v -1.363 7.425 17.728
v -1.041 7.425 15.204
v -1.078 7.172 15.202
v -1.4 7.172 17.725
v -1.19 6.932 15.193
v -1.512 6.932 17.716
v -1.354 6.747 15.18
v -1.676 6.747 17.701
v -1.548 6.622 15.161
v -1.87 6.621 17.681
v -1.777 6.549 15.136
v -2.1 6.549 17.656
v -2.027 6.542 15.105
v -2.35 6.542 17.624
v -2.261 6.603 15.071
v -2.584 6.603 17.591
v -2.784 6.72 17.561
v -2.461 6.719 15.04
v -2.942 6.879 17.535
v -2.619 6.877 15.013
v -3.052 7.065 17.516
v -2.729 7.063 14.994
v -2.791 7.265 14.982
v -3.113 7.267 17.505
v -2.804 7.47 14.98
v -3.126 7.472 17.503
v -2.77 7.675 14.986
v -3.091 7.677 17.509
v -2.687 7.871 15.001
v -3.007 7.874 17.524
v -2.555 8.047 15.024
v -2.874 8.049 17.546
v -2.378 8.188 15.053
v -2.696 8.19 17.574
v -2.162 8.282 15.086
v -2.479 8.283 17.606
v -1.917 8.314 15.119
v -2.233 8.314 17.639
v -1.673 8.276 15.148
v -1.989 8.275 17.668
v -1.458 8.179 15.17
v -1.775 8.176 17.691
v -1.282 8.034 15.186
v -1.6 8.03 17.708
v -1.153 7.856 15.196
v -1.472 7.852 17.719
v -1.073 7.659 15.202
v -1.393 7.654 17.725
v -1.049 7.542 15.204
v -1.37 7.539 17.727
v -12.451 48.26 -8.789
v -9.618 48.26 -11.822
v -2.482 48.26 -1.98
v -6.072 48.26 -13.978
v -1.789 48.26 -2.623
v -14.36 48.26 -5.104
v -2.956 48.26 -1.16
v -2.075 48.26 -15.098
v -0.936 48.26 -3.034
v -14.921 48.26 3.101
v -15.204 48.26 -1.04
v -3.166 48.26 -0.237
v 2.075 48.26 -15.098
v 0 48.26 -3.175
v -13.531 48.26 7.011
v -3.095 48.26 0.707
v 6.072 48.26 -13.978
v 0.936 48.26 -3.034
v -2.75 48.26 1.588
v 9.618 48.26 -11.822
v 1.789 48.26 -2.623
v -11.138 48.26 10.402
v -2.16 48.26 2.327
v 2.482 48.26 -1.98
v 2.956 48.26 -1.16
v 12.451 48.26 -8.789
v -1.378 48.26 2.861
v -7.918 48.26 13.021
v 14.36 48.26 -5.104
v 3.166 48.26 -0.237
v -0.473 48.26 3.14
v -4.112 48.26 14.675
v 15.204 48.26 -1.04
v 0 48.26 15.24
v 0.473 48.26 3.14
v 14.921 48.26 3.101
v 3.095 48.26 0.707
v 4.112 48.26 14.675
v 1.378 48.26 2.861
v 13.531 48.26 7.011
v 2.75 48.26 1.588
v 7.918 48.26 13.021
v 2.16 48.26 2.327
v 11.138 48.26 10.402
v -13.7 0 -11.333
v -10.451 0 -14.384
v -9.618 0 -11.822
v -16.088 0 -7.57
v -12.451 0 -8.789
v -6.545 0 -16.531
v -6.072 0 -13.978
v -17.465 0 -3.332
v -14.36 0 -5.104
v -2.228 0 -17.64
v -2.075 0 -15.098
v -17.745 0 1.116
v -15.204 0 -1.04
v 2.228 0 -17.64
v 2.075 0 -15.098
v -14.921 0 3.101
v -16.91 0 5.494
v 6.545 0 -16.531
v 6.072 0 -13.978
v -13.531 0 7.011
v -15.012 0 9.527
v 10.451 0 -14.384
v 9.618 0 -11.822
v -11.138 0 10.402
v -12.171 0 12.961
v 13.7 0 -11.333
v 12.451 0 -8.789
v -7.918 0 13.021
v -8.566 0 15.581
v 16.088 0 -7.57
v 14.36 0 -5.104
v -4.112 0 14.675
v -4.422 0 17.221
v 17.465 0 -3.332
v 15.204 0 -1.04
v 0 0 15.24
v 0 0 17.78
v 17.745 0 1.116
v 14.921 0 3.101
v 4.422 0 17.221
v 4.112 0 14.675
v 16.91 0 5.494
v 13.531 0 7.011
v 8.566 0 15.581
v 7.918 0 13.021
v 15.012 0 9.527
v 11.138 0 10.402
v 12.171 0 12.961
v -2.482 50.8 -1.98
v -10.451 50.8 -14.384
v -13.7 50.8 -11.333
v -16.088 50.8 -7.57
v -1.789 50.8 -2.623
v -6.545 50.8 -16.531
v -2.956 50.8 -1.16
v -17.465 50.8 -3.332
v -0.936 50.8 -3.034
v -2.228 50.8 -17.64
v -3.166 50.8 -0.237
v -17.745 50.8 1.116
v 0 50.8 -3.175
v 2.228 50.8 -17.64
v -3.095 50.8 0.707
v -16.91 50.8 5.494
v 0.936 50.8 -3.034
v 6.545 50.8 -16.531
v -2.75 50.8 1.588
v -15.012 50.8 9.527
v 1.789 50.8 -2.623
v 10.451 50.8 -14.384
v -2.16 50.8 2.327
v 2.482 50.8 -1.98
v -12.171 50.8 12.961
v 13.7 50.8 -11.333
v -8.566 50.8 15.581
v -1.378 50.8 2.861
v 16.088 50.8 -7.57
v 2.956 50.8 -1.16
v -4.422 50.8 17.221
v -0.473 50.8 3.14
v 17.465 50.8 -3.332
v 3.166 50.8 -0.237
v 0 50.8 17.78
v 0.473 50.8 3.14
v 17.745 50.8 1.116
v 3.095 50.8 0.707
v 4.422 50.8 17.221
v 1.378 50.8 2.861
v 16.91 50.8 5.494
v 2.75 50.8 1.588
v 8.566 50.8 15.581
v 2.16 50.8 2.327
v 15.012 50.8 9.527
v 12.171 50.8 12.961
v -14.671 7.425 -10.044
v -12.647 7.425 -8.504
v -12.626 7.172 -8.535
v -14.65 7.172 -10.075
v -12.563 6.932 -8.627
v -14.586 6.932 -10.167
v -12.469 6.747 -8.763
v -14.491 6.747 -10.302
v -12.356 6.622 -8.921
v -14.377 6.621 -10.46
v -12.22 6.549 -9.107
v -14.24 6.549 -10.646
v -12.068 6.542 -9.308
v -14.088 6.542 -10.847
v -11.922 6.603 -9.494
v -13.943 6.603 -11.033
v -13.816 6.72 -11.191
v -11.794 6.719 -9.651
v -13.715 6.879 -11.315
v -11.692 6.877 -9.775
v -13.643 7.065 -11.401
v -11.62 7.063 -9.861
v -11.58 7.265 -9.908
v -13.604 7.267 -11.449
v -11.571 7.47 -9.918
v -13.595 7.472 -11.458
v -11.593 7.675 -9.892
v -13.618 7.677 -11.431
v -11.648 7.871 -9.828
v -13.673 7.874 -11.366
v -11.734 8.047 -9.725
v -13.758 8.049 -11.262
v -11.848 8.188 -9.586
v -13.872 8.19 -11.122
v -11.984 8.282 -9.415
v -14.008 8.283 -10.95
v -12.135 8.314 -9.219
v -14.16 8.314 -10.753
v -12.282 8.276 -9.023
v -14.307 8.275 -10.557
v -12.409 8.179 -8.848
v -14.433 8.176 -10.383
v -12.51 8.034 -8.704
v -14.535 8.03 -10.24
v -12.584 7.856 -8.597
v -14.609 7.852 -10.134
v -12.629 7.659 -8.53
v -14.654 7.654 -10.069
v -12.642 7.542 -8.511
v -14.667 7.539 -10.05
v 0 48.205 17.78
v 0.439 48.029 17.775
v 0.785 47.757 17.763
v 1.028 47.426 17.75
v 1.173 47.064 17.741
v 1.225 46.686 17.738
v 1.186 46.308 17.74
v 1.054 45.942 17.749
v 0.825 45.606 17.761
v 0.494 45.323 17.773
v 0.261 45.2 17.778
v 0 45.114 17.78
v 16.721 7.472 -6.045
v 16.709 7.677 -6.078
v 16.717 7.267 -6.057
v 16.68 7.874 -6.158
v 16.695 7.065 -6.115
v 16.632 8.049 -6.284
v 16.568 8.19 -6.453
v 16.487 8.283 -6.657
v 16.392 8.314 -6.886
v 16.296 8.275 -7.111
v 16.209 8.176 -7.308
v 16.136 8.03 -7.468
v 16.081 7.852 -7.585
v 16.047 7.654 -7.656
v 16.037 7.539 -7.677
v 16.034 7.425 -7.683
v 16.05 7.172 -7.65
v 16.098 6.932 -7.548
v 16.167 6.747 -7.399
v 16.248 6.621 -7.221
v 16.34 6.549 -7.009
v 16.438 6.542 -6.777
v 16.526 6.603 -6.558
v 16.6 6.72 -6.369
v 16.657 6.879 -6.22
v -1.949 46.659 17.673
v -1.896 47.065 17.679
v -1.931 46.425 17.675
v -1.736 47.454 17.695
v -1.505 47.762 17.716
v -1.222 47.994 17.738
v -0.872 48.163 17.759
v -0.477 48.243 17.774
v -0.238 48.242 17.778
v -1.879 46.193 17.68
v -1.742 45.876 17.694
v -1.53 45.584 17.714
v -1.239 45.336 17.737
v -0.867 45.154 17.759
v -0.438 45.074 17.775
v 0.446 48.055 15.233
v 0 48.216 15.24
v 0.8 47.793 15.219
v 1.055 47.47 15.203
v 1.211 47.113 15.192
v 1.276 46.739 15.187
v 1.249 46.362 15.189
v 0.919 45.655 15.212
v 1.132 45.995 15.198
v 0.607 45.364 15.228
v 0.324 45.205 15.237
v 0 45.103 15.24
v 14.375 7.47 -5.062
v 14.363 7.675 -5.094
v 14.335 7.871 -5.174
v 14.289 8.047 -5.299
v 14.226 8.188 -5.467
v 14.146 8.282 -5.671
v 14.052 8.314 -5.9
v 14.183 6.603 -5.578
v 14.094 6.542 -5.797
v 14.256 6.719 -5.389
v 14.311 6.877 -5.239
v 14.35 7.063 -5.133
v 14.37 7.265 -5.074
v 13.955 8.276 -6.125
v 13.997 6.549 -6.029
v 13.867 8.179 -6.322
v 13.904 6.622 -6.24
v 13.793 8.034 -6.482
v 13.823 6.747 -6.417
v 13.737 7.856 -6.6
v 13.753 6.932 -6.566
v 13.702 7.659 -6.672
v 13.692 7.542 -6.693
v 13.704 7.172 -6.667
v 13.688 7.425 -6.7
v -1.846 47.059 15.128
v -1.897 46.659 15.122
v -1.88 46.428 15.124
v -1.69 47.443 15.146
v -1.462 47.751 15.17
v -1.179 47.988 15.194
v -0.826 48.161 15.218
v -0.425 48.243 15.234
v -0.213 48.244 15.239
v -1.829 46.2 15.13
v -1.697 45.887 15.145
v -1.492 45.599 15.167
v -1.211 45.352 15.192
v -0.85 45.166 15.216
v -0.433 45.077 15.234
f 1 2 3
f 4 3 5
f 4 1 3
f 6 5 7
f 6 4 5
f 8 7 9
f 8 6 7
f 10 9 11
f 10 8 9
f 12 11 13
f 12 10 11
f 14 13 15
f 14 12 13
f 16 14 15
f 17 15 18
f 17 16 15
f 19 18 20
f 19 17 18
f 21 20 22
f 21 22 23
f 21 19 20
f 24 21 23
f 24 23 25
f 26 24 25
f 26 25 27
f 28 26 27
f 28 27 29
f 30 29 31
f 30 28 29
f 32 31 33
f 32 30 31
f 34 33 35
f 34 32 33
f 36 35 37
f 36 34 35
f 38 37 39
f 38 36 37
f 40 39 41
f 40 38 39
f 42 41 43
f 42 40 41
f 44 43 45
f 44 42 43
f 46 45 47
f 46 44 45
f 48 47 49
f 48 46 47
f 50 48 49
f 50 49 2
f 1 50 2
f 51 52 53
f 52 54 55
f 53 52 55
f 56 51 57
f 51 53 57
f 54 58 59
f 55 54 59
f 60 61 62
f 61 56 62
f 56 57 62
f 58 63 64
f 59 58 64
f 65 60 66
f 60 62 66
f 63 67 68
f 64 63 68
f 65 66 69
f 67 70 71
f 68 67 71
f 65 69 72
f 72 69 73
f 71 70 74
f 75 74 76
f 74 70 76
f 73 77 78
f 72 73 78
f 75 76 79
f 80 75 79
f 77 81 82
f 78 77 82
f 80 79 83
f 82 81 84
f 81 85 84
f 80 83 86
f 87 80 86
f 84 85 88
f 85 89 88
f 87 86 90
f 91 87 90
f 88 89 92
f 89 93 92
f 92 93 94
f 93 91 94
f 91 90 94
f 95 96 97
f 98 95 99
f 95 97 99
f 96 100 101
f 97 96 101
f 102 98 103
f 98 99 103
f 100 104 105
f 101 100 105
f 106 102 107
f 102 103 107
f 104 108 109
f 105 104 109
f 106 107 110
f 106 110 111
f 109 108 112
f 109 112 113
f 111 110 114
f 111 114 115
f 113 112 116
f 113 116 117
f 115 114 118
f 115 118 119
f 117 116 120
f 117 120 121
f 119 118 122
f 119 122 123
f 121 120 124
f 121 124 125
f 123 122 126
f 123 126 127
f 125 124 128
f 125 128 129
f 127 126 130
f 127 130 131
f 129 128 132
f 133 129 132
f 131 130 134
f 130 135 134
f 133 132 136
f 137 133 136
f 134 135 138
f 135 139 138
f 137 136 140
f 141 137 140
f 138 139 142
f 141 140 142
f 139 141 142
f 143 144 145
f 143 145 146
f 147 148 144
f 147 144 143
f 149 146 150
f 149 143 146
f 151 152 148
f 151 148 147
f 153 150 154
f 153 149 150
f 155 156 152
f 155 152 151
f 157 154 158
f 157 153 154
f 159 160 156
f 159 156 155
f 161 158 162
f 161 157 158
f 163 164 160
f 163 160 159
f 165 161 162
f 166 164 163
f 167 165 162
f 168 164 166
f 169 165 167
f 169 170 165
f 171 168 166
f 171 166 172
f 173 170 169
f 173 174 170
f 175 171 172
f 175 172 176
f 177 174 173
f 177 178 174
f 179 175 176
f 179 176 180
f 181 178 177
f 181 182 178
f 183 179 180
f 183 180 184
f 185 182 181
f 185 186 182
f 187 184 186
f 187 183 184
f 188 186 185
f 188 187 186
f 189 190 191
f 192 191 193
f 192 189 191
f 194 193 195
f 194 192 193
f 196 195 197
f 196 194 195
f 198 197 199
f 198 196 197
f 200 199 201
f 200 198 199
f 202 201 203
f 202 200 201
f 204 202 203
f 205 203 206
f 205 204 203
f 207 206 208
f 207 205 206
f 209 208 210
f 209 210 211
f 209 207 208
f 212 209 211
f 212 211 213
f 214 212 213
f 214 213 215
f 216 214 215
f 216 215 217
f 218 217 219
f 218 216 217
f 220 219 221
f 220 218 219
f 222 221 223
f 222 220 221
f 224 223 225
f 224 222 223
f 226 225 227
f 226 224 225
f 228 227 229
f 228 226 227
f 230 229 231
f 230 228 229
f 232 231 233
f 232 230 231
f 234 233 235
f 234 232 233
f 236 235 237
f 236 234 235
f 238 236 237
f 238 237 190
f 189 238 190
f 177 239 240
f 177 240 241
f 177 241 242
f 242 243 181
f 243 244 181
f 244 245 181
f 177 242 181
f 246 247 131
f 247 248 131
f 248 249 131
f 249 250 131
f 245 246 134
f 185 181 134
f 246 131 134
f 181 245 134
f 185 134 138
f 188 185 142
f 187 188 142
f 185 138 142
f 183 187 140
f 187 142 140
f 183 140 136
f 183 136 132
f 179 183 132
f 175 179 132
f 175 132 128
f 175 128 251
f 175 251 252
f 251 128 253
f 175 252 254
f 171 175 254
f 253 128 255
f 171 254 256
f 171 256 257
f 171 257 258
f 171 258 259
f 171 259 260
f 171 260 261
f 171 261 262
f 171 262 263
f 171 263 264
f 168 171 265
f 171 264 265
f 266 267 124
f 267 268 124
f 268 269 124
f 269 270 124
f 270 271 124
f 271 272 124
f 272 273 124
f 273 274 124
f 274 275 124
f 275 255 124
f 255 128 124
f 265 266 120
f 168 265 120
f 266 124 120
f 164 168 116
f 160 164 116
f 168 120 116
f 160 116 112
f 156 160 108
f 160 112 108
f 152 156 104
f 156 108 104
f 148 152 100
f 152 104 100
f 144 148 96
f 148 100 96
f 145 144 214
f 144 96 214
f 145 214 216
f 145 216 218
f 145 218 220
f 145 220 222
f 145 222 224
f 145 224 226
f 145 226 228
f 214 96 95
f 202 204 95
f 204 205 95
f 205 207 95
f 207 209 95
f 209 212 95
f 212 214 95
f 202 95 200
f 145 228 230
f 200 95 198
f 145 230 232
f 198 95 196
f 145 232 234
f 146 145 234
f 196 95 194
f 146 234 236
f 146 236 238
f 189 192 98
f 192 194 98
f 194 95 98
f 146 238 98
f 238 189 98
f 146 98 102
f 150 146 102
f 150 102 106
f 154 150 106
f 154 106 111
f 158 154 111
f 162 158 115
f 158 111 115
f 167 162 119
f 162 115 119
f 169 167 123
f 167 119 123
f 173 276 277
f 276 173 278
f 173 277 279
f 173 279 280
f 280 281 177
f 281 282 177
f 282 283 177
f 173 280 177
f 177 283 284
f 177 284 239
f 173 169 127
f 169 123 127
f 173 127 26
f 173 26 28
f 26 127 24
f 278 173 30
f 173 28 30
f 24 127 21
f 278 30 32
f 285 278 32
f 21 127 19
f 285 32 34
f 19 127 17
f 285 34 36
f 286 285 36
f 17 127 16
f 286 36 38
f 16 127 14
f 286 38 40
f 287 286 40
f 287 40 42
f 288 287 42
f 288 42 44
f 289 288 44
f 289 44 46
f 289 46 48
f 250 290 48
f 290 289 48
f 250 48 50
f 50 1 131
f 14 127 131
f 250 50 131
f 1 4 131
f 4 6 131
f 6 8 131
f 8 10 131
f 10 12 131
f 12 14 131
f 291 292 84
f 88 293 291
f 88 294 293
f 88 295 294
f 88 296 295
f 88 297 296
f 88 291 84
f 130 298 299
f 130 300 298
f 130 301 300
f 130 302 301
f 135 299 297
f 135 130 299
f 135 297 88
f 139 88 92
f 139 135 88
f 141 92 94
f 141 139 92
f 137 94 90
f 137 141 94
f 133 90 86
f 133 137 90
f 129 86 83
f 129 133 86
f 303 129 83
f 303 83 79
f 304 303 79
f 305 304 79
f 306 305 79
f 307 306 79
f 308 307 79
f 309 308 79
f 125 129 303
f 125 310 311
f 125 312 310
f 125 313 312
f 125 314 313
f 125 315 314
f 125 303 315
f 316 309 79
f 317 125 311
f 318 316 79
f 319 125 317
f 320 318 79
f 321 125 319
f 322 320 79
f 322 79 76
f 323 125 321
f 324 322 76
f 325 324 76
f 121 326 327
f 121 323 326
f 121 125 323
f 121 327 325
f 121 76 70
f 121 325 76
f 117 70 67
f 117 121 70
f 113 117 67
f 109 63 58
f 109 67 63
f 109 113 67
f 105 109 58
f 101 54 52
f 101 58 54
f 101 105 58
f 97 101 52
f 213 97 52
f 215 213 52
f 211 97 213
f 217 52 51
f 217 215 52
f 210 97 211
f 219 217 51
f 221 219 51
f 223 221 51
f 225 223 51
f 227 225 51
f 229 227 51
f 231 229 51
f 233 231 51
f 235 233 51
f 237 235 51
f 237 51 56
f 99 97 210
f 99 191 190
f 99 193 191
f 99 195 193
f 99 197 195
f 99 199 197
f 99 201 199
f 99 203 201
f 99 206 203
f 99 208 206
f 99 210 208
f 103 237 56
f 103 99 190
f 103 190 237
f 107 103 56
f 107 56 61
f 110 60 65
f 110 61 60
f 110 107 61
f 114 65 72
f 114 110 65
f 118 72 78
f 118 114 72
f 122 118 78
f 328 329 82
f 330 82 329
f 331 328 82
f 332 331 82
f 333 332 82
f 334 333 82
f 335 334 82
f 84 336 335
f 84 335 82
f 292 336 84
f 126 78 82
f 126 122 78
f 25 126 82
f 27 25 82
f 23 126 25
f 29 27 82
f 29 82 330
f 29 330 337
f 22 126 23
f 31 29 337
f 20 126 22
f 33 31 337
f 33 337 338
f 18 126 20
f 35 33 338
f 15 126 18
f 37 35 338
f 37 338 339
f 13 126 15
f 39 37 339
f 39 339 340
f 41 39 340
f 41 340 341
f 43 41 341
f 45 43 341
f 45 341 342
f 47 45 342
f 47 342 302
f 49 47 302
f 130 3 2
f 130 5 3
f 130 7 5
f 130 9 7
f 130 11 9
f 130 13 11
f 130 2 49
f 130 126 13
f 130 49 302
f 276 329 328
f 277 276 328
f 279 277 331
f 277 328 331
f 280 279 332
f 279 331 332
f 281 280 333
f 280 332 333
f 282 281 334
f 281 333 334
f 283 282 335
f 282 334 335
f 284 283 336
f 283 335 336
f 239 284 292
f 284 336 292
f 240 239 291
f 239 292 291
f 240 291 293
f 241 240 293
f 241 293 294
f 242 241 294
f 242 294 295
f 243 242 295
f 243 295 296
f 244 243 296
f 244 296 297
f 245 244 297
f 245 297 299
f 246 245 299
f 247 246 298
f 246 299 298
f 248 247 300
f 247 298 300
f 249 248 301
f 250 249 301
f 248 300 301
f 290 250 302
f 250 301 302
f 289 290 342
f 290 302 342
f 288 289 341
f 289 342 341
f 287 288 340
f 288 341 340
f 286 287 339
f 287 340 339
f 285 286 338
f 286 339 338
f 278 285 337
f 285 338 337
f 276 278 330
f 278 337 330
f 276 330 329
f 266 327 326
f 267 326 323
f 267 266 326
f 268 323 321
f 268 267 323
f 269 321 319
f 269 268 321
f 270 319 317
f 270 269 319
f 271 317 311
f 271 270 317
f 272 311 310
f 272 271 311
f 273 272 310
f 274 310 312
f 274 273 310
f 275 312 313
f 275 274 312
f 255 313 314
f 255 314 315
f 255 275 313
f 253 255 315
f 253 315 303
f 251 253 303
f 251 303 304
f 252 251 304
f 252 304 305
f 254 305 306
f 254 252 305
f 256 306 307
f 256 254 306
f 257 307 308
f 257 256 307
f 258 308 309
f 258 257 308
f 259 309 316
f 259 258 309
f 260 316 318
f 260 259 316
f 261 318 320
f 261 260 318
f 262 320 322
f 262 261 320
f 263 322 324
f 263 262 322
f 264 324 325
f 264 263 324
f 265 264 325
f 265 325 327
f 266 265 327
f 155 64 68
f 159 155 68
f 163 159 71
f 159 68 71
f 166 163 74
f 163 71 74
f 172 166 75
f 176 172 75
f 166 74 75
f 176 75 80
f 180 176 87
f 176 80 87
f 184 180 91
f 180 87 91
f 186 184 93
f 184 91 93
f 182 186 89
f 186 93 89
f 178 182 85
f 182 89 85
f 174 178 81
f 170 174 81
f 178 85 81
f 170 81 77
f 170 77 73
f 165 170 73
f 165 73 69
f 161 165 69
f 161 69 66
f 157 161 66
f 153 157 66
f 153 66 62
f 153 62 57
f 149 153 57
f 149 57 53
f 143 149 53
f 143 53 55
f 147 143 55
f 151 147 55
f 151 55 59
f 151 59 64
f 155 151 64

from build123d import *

# Parameters (mm, degrees)
SKETCH1_R                     = 17.78
BOSS_EXTRUDE1_DEPTH           = 50.8
SHELL1_T                      = -2.54
SKETCH2_R                     = 3.175
CUT_EXTRUDE1_DEPTH            = 55.417684625
TAP_DRILL_FOR_0_80_TAP1_D     = 3.175
TAP_DRILL_FOR_0_80_TAP1_DEPTH = 6.35
TAP_DRILL_FOR_0_80_TAP1_TIP   = 1.332070664
CIRPATTERN1_COUNT             = 3


with BuildPart() as part:
    # Sketch1 → Boss-Extrude1 (new body)
    with BuildSketch(Plane(origin=(0, 0, 0), x_dir=(1, 0, 0), z_dir=(0, 1, 0))):
        with Locations(Location((0, 0, 0), (0, 0, 270))):
            Circle(SKETCH1_R)
    extrude(amount=BOSS_EXTRUDE1_DEPTH)

    # Shell1
    shell1_openings = [part.faces().sort_by_distance(p)[0] for p in [
        (0, 0, 0),
    ]]
    offset(amount=SHELL1_T, openings=shell1_openings, kind=Kind.INTERSECTION)

    # Sketch2 → Cut-Extrude1 (cut, through all)
    with BuildSketch(Plane.XZ.offset(-48.26)):
        with Locations(Location((0, 0, 0), (0, 0, 270))):
            Circle(SKETCH2_R)
    extrude(amount=-CUT_EXTRUDE1_DEPTH, mode=Mode.SUBTRACT)

    # Tap Drill for #0-80 Tap1
    with Locations(Plane(origin=(-0.363072826, 46.659447592, 17.776292587), x_dir=(0.999791484059, 0, 0.0204202939), z_dir=(-0.0204202939, 0, 0.999791484059))):
        with Locations((0, 0)):
            Hole(TAP_DRILL_FOR_0_80_TAP1_D / 2, depth=TAP_DRILL_FOR_0_80_TAP1_DEPTH)
            with Locations((0, 0, -(TAP_DRILL_FOR_0_80_TAP1_DEPTH + TAP_DRILL_FOR_0_80_TAP1_TIP / 2))):  # 100° drill point
                Cone(0, TAP_DRILL_FOR_0_80_TAP1_D / 2, TAP_DRILL_FOR_0_80_TAP1_TIP, mode=Mode.SUBTRACT)

    # Sketch8 → Tap Drill for #2-56 Tap1 (revolve, cut)
    with BuildSketch(Plane(origin=(-2.247699143, 7.424974445, 17.637353786), x_dir=(0.9919771533037619, 0, 0.1264172746240199), z_dir=(0, 1, 0))):
        Polygon((0, 0), (0, 9.635959572), (0.889, 8.89), (0.889, 0), align=None)
    tap_drill_for_2_56_tap1 = revolve(axis=Axis((-3.050448837, 7.424974445, 23.936408709), (0.1264172746240199, 0, -0.9919771533037619)), mode=Mode.SUBTRACT)

    # CirPattern1: Tap Drill for #2-56 Tap1 ×3 about axis
    cirpattern1_axis = Axis((0, 50.8, 0), (0, -1, 0))
    for i in range(1, CIRPATTERN1_COUNT):
        add(tap_drill_for_2_56_tap1.rotate(cirpattern1_axis, i * 360 / CIRPATTERN1_COUNT), mode=Mode.SUBTRACT)


solid = part.part
